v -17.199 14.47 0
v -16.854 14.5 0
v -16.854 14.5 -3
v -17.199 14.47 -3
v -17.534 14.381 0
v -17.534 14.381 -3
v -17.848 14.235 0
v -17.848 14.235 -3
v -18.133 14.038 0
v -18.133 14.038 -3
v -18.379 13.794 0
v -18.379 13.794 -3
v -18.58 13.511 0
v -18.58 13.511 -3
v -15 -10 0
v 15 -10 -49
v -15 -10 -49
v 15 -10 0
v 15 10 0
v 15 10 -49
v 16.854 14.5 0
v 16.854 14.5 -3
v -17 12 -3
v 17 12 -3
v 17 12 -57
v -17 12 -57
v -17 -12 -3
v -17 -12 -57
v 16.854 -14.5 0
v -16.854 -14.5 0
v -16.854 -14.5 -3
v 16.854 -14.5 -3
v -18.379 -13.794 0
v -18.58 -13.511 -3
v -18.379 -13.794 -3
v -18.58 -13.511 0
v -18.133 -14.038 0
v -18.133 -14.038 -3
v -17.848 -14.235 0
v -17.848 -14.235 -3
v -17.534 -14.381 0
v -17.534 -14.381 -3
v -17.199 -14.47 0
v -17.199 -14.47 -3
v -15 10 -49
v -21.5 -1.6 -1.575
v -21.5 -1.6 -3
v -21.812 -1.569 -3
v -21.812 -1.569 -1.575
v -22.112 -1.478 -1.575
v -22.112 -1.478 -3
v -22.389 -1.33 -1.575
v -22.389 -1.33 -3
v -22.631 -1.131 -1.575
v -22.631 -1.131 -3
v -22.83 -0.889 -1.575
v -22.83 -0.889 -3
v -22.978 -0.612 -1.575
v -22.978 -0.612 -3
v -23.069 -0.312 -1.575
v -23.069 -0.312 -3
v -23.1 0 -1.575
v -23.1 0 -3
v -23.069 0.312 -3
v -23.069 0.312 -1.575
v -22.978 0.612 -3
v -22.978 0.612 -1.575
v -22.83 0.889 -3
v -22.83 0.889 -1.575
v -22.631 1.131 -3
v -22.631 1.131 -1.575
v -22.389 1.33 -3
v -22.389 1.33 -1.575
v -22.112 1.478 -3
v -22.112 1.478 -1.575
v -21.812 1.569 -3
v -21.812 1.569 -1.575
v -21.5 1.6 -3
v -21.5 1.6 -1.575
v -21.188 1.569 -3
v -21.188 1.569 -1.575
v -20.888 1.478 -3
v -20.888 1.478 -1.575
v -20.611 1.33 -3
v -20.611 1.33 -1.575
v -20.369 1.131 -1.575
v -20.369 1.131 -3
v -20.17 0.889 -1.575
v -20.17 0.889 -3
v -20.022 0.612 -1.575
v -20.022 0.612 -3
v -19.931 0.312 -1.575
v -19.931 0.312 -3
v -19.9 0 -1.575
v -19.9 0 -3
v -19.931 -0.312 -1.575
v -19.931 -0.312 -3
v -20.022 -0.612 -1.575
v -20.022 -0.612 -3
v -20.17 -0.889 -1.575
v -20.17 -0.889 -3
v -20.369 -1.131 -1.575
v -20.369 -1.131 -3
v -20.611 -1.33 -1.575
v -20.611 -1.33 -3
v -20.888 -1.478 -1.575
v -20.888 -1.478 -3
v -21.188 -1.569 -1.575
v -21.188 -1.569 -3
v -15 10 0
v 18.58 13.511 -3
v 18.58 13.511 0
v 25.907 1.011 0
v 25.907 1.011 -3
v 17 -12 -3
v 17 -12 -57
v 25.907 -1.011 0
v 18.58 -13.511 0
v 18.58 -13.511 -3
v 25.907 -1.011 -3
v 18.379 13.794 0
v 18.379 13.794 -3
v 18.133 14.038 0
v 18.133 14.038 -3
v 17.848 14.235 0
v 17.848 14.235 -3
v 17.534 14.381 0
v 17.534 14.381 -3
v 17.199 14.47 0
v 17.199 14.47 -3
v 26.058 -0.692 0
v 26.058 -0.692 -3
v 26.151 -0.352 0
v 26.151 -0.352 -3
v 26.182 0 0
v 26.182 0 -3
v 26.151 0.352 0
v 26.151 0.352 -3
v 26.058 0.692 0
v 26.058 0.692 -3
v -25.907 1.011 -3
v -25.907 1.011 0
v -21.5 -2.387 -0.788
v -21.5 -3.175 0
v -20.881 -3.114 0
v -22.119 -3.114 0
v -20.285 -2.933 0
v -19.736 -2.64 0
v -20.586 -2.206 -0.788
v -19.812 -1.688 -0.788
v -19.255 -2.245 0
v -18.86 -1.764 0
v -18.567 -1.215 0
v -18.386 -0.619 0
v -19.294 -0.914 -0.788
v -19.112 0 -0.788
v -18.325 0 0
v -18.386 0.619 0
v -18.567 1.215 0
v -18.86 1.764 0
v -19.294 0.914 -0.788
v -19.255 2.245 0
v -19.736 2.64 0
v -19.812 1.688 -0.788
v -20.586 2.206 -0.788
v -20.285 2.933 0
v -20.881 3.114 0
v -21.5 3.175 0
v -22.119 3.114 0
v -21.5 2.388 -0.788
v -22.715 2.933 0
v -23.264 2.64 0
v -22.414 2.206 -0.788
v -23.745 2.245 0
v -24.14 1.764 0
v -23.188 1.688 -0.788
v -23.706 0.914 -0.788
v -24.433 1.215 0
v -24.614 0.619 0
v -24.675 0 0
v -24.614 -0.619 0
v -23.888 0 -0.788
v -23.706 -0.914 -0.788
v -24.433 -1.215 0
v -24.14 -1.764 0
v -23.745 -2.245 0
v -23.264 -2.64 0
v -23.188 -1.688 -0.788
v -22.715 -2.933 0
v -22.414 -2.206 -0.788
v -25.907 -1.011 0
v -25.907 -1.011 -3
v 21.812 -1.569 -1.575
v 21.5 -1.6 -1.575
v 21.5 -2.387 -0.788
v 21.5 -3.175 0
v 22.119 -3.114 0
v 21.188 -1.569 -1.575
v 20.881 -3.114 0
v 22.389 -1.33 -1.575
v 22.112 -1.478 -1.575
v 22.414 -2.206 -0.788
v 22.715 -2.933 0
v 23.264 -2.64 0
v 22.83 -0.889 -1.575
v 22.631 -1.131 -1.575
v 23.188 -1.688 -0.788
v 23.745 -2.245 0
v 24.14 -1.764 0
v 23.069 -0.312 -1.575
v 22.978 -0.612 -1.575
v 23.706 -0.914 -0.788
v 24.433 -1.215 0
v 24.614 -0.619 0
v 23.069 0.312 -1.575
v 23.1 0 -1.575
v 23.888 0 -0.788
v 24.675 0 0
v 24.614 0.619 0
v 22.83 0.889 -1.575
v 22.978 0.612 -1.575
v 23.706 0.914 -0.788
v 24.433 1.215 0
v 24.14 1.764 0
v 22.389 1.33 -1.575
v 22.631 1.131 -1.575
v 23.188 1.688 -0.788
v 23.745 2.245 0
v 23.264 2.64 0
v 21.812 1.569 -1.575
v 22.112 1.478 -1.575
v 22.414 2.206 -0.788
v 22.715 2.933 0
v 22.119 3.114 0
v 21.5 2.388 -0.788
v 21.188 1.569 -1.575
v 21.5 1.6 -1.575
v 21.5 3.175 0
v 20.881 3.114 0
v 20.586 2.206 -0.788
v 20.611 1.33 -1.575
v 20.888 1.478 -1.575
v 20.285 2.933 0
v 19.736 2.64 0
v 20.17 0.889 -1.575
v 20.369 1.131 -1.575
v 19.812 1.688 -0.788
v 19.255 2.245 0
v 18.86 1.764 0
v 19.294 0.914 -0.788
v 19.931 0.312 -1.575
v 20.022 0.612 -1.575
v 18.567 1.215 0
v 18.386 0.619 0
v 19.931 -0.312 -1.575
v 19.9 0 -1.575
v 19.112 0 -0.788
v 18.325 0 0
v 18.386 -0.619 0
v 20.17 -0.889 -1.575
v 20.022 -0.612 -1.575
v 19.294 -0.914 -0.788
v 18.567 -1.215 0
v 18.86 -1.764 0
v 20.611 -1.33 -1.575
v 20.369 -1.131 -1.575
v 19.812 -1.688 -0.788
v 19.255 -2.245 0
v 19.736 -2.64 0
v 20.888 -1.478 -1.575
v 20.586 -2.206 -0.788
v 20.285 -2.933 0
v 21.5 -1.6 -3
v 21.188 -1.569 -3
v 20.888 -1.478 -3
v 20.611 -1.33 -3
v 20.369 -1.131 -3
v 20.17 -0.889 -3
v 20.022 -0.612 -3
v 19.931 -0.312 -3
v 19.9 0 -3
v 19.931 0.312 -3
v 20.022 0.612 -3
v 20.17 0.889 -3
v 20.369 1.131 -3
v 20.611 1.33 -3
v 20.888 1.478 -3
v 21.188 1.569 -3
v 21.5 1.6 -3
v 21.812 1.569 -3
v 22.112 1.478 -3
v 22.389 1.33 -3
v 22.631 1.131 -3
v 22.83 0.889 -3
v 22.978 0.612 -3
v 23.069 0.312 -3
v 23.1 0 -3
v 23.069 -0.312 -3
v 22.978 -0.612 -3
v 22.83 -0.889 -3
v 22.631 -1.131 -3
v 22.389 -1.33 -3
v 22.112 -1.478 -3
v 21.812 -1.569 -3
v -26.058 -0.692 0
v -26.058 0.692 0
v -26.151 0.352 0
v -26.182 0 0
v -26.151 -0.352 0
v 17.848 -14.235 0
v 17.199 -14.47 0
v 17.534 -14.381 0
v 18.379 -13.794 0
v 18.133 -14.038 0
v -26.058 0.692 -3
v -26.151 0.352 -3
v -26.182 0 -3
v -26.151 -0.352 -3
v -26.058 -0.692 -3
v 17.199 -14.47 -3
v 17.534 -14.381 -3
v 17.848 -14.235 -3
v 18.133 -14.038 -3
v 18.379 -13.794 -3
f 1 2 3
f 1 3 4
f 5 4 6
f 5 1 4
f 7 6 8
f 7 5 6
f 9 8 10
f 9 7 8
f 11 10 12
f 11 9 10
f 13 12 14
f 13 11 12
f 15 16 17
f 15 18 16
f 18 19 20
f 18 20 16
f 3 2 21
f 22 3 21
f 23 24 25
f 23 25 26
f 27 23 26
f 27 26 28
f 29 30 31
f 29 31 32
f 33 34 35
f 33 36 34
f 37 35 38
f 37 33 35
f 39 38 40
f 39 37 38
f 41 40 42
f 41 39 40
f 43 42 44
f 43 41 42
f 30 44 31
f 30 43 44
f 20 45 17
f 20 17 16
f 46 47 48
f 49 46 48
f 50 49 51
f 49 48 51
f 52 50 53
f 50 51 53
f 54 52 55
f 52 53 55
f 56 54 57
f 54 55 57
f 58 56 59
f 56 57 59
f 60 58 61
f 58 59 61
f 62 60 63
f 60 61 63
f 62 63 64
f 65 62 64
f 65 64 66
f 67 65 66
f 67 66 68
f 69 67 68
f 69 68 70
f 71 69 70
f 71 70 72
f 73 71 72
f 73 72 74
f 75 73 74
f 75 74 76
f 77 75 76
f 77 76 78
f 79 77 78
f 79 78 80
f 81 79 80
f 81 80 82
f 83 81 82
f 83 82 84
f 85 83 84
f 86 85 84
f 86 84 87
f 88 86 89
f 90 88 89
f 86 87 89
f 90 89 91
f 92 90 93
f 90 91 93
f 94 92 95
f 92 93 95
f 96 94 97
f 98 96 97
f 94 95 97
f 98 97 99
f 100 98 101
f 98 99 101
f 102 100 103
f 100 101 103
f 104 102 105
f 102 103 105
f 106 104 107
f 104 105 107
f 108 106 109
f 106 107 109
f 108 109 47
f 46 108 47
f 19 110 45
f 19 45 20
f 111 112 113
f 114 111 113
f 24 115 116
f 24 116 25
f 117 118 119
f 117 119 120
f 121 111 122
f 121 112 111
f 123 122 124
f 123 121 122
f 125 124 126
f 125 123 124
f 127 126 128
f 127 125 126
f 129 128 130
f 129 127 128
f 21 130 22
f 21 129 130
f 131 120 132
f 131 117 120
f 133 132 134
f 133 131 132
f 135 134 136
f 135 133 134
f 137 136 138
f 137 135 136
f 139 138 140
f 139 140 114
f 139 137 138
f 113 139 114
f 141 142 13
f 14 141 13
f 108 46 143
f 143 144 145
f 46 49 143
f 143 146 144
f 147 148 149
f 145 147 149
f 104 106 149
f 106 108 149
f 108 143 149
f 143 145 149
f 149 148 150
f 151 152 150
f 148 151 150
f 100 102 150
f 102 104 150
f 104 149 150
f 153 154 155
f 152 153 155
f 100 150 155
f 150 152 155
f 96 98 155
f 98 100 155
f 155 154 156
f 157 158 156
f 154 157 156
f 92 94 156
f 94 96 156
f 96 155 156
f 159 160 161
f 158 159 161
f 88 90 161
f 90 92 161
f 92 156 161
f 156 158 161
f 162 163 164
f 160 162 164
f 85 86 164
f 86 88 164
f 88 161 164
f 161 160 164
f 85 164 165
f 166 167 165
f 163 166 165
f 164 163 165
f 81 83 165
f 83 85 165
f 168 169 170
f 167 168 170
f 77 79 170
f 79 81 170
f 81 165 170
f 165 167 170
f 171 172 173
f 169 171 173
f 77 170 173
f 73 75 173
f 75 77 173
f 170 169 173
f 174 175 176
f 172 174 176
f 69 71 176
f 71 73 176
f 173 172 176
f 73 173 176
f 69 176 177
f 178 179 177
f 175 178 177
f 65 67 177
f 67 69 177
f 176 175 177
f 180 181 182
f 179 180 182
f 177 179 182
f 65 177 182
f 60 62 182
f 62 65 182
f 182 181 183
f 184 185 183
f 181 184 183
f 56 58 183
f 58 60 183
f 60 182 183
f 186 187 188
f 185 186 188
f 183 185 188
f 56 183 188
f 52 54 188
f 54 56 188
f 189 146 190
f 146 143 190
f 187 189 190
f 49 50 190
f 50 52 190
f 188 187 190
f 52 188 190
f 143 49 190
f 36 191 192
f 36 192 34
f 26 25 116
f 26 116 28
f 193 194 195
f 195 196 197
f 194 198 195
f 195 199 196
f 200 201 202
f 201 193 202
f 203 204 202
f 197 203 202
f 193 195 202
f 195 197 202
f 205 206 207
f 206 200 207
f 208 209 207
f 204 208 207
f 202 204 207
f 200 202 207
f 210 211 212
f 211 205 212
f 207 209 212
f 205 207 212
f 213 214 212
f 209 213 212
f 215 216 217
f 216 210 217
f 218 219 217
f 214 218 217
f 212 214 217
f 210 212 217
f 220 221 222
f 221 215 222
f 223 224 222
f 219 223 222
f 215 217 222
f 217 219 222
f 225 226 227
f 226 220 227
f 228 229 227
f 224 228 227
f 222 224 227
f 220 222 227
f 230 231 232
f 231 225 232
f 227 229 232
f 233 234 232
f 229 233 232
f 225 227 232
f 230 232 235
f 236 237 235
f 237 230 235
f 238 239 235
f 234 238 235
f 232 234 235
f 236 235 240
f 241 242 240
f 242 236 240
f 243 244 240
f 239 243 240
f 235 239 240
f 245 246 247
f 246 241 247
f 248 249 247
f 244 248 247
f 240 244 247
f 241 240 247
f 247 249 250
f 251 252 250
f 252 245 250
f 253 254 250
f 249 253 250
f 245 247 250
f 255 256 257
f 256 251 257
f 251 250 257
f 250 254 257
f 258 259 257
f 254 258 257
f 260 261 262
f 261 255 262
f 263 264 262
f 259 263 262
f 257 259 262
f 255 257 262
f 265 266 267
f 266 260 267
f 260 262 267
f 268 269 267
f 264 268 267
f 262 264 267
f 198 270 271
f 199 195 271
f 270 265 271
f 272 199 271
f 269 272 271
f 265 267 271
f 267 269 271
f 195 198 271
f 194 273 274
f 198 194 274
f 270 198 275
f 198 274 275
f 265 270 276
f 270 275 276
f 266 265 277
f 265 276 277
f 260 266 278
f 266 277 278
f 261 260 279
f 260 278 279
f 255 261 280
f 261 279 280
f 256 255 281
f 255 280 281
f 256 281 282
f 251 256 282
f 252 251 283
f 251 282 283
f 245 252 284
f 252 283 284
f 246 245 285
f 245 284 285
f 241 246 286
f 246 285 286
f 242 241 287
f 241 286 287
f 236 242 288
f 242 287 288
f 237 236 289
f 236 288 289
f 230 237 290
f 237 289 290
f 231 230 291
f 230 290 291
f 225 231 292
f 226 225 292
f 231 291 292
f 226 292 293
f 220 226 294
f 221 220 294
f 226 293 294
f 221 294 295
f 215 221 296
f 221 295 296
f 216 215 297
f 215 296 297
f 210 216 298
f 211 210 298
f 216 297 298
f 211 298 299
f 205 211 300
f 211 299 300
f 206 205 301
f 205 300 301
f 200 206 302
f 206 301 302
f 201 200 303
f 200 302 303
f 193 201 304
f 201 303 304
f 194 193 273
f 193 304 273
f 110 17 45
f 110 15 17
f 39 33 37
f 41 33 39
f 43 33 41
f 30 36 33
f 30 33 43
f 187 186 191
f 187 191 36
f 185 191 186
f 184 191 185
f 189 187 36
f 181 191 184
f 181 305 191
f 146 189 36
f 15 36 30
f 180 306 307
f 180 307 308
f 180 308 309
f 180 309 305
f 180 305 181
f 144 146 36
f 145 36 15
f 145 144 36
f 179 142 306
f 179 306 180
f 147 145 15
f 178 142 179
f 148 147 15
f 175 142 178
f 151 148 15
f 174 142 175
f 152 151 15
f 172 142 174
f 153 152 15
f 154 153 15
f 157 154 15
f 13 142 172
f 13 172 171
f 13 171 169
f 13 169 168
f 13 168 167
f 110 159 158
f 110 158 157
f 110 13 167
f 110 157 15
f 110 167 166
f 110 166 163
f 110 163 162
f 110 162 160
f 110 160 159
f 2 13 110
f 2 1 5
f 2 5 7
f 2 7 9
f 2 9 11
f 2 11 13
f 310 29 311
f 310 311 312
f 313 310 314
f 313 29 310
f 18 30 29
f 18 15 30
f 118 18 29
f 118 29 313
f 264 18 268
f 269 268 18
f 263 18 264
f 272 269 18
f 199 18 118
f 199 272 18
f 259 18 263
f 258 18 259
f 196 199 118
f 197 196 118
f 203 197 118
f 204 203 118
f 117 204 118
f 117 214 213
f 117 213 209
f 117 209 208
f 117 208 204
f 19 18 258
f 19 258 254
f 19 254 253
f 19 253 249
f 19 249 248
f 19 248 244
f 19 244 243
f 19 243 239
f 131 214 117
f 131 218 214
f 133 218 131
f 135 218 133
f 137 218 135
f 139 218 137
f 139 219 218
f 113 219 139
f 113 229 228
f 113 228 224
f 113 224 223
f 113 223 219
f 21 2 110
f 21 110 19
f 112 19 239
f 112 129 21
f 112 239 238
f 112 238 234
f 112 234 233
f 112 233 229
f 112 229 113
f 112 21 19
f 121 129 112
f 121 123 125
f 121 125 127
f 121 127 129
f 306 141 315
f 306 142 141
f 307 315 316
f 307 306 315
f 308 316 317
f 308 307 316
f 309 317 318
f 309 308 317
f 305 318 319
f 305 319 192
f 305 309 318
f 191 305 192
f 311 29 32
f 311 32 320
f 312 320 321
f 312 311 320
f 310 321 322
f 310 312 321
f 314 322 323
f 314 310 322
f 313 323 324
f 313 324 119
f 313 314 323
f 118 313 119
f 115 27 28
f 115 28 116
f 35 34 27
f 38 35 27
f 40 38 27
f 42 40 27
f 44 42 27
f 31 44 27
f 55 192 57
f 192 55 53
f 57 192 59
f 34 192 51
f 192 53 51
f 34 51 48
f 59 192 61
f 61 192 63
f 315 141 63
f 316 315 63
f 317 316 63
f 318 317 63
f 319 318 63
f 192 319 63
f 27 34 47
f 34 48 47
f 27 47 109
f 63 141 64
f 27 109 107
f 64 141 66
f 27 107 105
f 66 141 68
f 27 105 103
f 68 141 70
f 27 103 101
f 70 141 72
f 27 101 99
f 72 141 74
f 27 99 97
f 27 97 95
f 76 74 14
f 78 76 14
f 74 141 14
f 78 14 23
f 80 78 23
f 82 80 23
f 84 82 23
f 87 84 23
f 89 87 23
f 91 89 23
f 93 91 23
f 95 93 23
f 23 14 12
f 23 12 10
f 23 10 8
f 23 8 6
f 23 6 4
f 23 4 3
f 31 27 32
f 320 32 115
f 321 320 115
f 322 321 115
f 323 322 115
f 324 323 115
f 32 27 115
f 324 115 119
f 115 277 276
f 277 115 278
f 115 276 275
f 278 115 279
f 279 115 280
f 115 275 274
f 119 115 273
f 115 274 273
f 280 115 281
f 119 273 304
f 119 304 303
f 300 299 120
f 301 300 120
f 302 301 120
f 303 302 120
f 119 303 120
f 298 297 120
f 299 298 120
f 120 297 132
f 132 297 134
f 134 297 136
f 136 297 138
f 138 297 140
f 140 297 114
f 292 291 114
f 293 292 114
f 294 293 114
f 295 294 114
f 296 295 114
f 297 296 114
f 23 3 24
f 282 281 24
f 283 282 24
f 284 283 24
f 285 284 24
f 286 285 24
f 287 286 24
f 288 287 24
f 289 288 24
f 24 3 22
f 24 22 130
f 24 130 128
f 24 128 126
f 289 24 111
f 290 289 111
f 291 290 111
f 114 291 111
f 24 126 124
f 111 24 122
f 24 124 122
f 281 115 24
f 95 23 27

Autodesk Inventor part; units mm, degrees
ref_plane "YZ Plane" through (0, 0, 0) normal (1, 0, 0) x (0, 1, 0)
ref_plane "XZ Plane" through (0, 0, 0) normal (0, 1, 0) x (-1, 0, 0)
ref_plane "XY Plane" through (0, 0, 0) normal (0, 0, 1) x (1, 0, 0)
sketch "Sketch1" plane through (0, 0, 0) normal (0, 0, 1) x (1, 0, 0)
  line L0 (-25.9071, 1.0114) -> (-18.5795, 13.5114)
  line L1 (-16.8541, 14.5) -> (16.8541, 14.5)
  line L2 (18.5795, 13.5114) -> (25.9071, 1.0114)
  arc A0 (-16.8541, 14.5) -> (-18.5795, 13.5114) centre (-16.8541, 12.5) ccw
  arc A1 (18.5795, 13.5114) -> (16.8541, 14.5) centre (16.8541, 12.5) ccw
  line L3 (-28.1394, 0) -> (29.237, 0) construction
  line L4 (-25.9071, -1.0114) -> (-18.5795, -13.5114)
  line L5 (-16.8541, -14.5) -> (16.8541, -14.5)
  line L6 (18.5795, -13.5114) -> (25.9071, -1.0114)
  arc A2 (-18.5795, -13.5114) -> (-16.8541, -14.5) centre (-16.8541, -12.5) ccw
  arc A3 (16.8541, -14.5) -> (18.5795, -13.5114) centre (16.8541, -12.5) ccw
  arc A4 (-25.9071, 1.0114) -> (-25.9071, -1.0114) centre (-24.1817, 0) ccw
  arc A5 (25.9071, -1.0114) -> (25.9071, 1.0114) centre (24.1817, 0) ccw
  point P0 (0, 0)
  point P1 (-26.5, 0)
  point P2 (-18, 14.5)
  point P3 (18, 14.5)
  point P4 (26.5, 0)
  point P5 (-18, -14.5)
  point P6 (18, -14.5)
  dimension "d0" = 53
  dimension "d1" = 26.5
  dimension "d2" = 14.5
  dimension "d3" = 36
  dimension "d4" = 18
  dimension "d5" = 2
  dimension "d6" = 2
extrude "Extrusion1" add sketch "Sketch1" against normal blind 3
sketch "Sketch2" plane through (0, 0, 0) normal (0, 0, 1) x (1, 0, 0)
  point P0 (0, 0)
  point P1 (-21.5, 0)
  point P2 (21.5, 0)
  dimension "d9" = 43
  dimension "d10" = 21.5
hole "Hole1" at (-21.5, 0, 0) at (21.5, 0, 0) direction (0, 0, -1) diameter 3.2 end through all countersink diameter 6.35 countersink angle 90 clearance for "Flat Head Machine Screw" size "M3" standard "Ansi Metric M Profile"
sketch "Sketch3" plane through (0, 0, -3) normal (0, 0, -1) x (-1, 0, 0)
  line L0 (-17, 12) -> (17, 12)
  line L1 (17, 12) -> (17, -12)
  line L2 (17, -12) -> (-17, -12)
  line L3 (-17, -12) -> (-17, 12)
  point P0 (0, 0)
  dimension "d18" = 24
  dimension "d19" = 34
  dimension "d20" = 17
  dimension "d21" = 12
extrude "Extrusion2" add sketch "Sketch3" along normal blind 54
sketch "Sketch4" plane through (0, 0, 0) normal (0, 0, 1) x (1, 0, 0)
  line L0 (-15, 10) -> (15, 10)
  line L1 (15, 10) -> (15, -10)
  line L2 (15, -10) -> (-15, -10)
  line L3 (-15, -10) -> (-15, 10)
  point P0 (0, 0)
  dimension "d24" = 30
  dimension "d25" = 20
  dimension "d26" = 15
  dimension "d27" = 10
extrude "Extrusion3" cut sketch "Sketch4" against normal blind 49
equation "\"d1\" = 0.5 * d0"
equation "\"d4\" = 0.5 * d3"
equation "\"d10\" = 0.5 * d9"
equation "\"d20\" = 0.5 * d19"
equation "\"d21\" = 0.5 * d18"
equation "\"d26\" = 0.5 * d24"
equation "\"d27\" = 0.5 * d25"
properties part number "BatteryHolder_DigiKEY" material "ABS Plastic"
